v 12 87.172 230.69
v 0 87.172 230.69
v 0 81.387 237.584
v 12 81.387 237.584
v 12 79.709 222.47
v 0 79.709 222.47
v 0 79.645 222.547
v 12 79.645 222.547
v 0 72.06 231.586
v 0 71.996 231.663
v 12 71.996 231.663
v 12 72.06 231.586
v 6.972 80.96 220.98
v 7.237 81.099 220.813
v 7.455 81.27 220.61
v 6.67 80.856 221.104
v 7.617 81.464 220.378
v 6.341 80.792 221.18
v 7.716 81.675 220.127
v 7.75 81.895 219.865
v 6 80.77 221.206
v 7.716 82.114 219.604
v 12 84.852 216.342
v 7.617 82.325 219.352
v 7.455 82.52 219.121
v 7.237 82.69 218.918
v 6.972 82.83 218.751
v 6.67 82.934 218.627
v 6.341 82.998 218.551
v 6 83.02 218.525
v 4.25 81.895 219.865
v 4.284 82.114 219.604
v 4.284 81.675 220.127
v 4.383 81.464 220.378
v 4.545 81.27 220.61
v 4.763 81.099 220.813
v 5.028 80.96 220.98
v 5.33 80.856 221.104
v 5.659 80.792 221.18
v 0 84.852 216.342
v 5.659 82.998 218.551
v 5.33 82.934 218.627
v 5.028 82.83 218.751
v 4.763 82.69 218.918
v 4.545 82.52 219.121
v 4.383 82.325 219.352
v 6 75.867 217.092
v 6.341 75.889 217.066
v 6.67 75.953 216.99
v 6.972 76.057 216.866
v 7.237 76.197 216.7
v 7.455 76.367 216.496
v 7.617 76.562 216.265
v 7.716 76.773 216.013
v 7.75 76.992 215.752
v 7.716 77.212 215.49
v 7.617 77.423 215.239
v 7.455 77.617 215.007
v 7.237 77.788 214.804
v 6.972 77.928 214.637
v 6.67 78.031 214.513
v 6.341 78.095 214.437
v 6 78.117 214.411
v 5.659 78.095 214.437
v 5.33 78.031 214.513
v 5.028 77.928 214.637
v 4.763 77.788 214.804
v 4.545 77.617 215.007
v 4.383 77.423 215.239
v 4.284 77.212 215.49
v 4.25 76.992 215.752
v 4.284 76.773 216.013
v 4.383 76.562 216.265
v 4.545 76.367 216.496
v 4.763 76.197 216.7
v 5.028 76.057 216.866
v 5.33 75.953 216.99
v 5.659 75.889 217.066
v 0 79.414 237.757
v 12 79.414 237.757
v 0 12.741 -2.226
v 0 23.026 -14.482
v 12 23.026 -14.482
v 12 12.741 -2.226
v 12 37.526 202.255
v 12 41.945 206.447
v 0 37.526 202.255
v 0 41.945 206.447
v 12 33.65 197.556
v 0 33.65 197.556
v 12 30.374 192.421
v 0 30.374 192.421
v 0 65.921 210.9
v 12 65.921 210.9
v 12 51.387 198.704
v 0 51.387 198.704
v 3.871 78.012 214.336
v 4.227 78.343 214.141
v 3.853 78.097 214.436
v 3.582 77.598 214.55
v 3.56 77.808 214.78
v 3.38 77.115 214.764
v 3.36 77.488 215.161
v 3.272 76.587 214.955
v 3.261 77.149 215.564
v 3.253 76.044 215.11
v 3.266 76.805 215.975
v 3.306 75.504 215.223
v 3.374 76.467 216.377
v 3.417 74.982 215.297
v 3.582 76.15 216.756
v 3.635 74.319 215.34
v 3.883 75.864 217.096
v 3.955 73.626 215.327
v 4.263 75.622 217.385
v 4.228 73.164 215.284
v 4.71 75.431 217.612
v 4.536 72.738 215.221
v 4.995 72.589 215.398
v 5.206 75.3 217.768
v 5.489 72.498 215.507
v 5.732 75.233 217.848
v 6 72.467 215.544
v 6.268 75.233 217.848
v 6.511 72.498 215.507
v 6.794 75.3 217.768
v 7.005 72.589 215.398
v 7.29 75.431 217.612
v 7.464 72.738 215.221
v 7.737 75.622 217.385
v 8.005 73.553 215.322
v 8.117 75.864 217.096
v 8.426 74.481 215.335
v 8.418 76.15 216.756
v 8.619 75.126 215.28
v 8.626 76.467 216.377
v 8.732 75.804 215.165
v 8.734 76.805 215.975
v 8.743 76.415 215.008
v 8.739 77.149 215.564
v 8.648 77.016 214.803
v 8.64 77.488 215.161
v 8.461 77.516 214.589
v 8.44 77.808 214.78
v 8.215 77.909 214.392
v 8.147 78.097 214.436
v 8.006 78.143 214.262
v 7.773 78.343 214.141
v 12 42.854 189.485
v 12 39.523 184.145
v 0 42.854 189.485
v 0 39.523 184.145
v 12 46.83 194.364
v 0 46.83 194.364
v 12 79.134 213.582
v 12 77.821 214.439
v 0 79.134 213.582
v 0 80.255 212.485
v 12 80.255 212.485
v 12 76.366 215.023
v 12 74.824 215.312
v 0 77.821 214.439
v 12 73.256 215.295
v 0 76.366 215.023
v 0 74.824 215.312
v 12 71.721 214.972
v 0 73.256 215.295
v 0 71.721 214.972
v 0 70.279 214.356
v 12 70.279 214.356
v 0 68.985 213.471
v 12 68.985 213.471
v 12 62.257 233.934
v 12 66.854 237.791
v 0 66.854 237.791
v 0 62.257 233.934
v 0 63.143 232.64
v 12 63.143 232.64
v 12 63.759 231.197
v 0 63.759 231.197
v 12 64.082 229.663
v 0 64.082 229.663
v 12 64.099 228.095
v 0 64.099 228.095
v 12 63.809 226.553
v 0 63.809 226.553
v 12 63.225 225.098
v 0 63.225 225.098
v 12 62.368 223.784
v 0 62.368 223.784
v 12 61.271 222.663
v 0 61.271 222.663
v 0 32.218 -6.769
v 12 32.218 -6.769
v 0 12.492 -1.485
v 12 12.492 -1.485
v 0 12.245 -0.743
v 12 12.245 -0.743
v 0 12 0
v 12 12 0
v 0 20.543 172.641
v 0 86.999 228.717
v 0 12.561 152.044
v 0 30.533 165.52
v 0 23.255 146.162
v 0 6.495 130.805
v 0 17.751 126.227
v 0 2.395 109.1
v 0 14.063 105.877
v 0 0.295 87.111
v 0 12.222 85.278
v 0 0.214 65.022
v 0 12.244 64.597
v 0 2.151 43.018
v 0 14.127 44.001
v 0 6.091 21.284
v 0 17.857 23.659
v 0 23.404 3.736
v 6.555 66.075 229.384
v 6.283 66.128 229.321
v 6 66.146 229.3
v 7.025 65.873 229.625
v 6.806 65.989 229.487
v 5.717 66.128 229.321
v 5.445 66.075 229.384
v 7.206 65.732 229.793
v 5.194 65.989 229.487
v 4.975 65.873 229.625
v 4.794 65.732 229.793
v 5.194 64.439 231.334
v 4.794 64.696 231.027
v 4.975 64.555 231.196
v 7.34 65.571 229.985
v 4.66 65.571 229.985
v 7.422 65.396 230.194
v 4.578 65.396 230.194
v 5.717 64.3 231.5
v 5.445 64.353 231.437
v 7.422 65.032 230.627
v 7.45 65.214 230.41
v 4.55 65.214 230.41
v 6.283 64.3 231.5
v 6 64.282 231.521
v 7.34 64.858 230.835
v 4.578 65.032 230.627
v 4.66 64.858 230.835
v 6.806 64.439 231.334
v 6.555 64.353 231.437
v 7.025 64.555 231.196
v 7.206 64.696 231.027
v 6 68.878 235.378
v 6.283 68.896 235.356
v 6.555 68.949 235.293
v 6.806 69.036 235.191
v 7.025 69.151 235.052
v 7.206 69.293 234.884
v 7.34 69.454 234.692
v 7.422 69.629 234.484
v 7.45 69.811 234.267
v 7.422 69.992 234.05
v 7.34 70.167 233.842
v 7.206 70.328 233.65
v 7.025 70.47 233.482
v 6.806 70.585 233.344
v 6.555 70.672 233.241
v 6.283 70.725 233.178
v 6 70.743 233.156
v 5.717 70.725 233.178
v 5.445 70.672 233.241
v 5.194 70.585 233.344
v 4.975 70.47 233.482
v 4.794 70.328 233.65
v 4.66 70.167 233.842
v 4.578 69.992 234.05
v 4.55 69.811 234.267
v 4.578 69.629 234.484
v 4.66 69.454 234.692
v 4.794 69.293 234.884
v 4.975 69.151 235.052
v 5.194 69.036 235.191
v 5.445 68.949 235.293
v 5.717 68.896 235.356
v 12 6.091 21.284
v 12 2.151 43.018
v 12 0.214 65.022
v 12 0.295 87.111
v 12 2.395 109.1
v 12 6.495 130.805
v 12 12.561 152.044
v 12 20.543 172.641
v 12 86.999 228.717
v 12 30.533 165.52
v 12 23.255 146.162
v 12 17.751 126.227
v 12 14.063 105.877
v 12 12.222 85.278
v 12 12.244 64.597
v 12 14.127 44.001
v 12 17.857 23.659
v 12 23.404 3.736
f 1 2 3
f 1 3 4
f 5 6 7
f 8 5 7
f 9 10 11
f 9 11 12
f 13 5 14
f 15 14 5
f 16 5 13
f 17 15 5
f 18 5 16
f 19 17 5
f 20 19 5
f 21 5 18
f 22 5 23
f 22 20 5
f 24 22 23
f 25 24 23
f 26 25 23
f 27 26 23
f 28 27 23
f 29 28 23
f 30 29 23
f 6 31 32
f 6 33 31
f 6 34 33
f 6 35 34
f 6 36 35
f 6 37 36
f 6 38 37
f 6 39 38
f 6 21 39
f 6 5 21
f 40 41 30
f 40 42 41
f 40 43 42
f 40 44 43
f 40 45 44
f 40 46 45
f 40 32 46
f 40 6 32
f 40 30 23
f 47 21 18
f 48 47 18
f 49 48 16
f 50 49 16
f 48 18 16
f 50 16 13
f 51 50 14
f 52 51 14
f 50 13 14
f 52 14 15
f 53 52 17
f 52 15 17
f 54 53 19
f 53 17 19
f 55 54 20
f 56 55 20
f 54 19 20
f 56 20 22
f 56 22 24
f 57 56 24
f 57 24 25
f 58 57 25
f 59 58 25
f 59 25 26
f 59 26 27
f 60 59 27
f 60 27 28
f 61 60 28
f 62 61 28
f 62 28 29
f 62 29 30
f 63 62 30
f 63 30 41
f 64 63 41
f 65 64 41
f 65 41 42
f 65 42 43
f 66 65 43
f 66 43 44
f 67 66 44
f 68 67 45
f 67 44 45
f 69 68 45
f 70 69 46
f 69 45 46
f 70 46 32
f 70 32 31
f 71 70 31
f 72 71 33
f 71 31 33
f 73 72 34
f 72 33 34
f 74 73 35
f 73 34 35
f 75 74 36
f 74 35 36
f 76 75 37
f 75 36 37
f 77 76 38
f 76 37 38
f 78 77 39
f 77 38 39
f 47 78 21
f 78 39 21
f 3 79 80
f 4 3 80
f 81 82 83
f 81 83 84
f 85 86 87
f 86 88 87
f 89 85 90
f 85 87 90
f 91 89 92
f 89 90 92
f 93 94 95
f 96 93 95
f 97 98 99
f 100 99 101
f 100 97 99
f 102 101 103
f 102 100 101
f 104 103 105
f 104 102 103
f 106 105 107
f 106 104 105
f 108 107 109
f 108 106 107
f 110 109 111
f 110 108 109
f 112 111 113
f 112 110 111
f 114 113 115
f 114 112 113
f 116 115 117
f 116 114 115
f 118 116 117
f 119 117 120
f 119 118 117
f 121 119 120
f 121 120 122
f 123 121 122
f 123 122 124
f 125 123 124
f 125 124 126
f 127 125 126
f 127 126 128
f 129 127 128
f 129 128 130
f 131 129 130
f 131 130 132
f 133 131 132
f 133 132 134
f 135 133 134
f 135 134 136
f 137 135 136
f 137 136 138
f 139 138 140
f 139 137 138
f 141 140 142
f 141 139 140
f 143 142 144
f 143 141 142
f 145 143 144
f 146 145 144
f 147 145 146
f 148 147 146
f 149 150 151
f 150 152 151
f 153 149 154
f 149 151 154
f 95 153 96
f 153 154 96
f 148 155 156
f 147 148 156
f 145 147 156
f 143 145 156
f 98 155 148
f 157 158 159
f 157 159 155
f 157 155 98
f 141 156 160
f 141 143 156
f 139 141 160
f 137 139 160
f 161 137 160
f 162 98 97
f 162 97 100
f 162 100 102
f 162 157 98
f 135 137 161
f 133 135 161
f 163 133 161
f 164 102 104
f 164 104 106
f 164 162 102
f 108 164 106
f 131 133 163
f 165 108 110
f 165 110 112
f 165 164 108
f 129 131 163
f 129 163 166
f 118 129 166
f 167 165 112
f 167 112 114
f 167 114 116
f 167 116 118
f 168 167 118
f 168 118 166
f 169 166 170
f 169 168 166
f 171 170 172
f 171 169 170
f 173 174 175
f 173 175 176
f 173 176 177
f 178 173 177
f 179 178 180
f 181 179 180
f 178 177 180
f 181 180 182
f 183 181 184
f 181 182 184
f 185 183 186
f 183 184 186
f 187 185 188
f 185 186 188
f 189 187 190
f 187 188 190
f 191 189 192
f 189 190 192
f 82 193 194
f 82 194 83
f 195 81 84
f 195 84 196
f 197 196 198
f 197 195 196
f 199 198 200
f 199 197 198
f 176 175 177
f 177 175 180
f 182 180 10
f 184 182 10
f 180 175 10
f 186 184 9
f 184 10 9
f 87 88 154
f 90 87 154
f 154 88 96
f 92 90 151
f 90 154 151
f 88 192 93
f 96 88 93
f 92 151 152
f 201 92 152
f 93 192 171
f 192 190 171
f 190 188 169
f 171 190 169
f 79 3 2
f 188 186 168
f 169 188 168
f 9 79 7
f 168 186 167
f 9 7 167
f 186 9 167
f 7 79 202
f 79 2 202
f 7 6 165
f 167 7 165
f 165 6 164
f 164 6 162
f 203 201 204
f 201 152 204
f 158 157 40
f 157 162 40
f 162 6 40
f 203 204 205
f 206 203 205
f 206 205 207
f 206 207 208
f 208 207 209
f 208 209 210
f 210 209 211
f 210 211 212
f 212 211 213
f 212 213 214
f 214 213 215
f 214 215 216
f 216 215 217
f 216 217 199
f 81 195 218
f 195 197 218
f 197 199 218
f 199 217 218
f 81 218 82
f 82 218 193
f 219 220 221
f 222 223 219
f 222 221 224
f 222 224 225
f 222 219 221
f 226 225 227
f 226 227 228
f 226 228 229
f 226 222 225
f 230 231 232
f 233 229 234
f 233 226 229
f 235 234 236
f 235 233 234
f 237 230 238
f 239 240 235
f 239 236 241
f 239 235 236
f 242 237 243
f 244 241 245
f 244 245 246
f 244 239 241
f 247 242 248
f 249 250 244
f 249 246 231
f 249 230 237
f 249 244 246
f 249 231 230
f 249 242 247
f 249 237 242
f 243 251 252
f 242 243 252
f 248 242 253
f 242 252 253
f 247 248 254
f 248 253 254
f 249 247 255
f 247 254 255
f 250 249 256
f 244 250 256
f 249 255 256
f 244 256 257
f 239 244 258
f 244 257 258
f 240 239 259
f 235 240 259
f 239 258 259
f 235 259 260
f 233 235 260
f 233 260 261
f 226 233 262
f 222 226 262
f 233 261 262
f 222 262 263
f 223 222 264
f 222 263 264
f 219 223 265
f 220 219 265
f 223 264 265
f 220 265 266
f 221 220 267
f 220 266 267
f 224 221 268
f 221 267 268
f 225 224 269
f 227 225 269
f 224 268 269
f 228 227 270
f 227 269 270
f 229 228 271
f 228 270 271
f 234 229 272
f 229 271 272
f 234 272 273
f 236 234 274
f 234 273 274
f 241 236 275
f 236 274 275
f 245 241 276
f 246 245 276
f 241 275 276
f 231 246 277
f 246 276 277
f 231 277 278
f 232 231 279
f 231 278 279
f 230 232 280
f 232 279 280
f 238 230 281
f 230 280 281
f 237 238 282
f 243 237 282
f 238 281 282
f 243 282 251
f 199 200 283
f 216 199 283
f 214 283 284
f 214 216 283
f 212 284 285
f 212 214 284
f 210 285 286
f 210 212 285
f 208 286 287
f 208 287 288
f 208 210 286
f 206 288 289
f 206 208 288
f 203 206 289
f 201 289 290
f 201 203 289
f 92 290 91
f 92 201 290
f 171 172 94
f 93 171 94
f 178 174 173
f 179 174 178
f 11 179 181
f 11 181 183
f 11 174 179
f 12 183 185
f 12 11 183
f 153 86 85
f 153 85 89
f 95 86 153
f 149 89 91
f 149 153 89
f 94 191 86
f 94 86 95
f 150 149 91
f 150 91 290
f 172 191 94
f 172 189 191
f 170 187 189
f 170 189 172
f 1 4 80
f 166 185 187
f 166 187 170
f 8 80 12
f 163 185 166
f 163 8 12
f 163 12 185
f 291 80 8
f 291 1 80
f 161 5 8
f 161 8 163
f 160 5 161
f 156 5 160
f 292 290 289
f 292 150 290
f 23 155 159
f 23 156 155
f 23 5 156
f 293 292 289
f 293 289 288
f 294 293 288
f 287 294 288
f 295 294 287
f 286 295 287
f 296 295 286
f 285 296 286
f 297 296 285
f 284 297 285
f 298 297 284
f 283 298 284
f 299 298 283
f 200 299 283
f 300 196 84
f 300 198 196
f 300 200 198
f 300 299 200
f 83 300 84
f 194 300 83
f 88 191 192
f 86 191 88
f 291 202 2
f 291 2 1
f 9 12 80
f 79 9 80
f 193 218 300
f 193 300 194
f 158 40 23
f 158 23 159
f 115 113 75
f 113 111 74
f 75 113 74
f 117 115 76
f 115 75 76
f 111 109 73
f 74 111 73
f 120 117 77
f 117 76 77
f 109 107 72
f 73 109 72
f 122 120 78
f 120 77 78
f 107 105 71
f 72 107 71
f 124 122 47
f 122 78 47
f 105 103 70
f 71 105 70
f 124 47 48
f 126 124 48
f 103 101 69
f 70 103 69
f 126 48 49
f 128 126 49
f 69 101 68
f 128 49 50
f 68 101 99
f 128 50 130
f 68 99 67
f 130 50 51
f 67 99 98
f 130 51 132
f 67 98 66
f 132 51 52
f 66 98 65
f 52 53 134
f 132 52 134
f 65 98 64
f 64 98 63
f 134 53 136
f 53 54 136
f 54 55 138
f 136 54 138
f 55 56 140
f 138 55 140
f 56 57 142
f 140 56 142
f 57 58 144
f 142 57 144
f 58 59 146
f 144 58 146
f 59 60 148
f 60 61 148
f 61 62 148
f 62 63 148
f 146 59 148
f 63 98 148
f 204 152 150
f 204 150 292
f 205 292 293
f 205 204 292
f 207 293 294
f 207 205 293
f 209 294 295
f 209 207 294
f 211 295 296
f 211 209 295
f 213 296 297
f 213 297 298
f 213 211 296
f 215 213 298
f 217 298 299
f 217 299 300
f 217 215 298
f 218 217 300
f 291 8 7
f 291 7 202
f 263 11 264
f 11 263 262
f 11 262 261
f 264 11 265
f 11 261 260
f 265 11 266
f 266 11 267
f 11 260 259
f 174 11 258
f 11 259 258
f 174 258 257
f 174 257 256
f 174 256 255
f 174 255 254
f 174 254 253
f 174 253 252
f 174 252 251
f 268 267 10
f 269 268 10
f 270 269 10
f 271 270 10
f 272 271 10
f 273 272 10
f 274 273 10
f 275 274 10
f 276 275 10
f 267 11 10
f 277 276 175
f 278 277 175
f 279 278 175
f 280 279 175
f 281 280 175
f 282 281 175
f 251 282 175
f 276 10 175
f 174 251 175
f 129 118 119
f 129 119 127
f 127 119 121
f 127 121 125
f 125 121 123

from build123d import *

# Parameters (mm, degrees)
AUFSATZ_LINEAR_AUSTRAGEN1_DEPTH  = 12
AUFSATZ_LINEAR_AUSTRAGEN3_DEPTH  = 12
AUFSATZ_LINEAR_AUSTRAGEN4_DEPTH  = 12
SCHNITT_LINEAR_AUSTRAGEN1_DEPTH  = 254.175024926
VERRUNDUNG1_R                    = 50
SKIZZE9_W                        = 12
SKIZZE9_H                        = 12
AUFSATZ_LINEAR_AUSTRAGEN6_DEPTH  = 11
AUFSATZ_LINEAR_AUSTRAGEN7_DEPTH  = 12
SKIZZE11_R                       = 1.75
SCHNITT_LINEAR_AUSTRAGEN3_DEPTH  = 10
SKIZZE12_R                       = 2.75
SCHNITT_LINEAR_AUSTRAGEN4_DEPTH  = 3.6
FASE1_SIZE                       = 1.5
SCHNITT_LINEAR_AUSTRAGEN8_DEPTH  = 254.549622303
SKIZZE11_3_R                     = 1.45
SCHNITT_LINEAR_AUSTRAGEN10_DEPTH = 6


with BuildPart() as part:
    # Skizze1 → Aufsatz-Linear austragen1 (new body)
    with BuildSketch(Plane(origin=(0, 0, 0), x_dir=(0, 0, -1), z_dir=(1, 0, 0))):
        with BuildLine():
            Line((-240, 65), (-230.735708163, 72.773663864))
            ThreePointArc((-230.735708163, 72.773663864), (-123.944567763, 17.242039243), (-3.735818811, 23.403668612))
            Line((-3.735818811, 23.403668612), (0, 12))
            ThreePointArc((0, 12), (-127.247502729, 5.681119716), (-240, 65))
        make_face()
    extrude(amount=AUFSATZ_LINEAR_AUSTRAGEN1_DEPTH)

    # Skizze4 → Aufsatz-Linear austragen3 (add)
    with BuildSketch(Plane(origin=(0, 0, 0), x_dir=(0, 0, -1), z_dir=(1, 0, 0))):
        with BuildLine():
            Line((-3.735818811, 23.403668612), (6.769031275, 32.218284445))
            Line((6.769031275, 32.218284445), (14.482482591, 23.025751128))
            Line((14.482482591, 23.025751128), (2.225771501, 12.741149373))
            ThreePointArc((2.225771501, 12.741149373), (1.113785782, 12.367871772), (0, 12))
            Line((0, 12), (-3.735818811, 23.403668612))
        make_face()
    extrude(amount=AUFSATZ_LINEAR_AUSTRAGEN3_DEPTH)

    # Skizze5 → Aufsatz-Linear austragen4 (add)
    with BuildSketch(Plane(origin=(12, 0, 0), x_dir=(0, 0, -1), z_dir=(1, 0, 0))):
        Polygon((-231.662517154, 71.995978781), (-222.469983836, 79.709430098), (-210.899806862, 65.920630121), (-192.948331238, 44.526894555), (-220.092340179, 58.207178805), align=None)
    extrude(amount=-AUFSATZ_LINEAR_AUSTRAGEN4_DEPTH)

    # Skizze6 → Schnitt-Linear austragen1 (cut, through all)
    with BuildSketch(Plane(origin=(12, 0, 0), x_dir=(0, 0, -1), z_dir=(1, 0, 0))):
        Polygon((-231.662517154, 71.995978781), (-199.510648028, 33.678873242), (-204.367668784, 29.603348917), (-240, 65), align=None)
    extrude(amount=-SCHNITT_LINEAR_AUSTRAGEN1_DEPTH, mode=Mode.SUBTRACT)

    # Verrundung1
    verrundung1_edges = [part.edges().sort_by_distance(p)[0] for p in [
        (6, 44.526894555, 192.948331238),
        (6, 35.285406895, 200.858689823),
    ]]
    fillet(verrundung1_edges, radius=VERRUNDUNG1_R)

    # Skizze9 → Aufsatz-Linear austragen6 (add)
    with BuildSketch(Plane(origin=(0, 156.320496136, 131.168470653), x_dir=(1, 0, 0), z_dir=(0, 0.7660444431189836, 0.6427876096865328))):
        with Locations((6, -125.185660837)):
            Rectangle(SKIZZE9_W, SKIZZE9_H)
    extrude(amount=AUFSATZ_LINEAR_AUSTRAGEN6_DEPTH)

    # Skizze10 → Aufsatz-Linear austragen7 (add)
    with BuildSketch(Plane.ZY):
        with BuildLine():
            Line((231.662517154, 71.995978781), (237.790872699, 66.853677904))
            Line((237.790872699, 66.853677904), (233.93414704, 62.257411245))
            ThreePointArc((233.93414704, 62.257411245), (228.094600221, 64.098613285), (222.663490618, 61.271356578))
            Line((222.663490618, 61.271356578), (231.662517154, 71.995978781))
        make_face()
        with BuildLine():
            Line((213.470957301, 68.984807894), (222.469983836, 79.709430098))
            Line((222.469983836, 79.709430098), (216.341628291, 84.851730975))
            Line((216.341628291, 84.851730975), (212.484902633, 80.255464316))
            ThreePointArc((212.484902633, 80.255464316), (215.31215934, 74.824354713), (213.470957301, 68.984807894))
        make_face()
    extrude(amount=-AUFSATZ_LINEAR_AUSTRAGEN7_DEPTH)

    # Skizze11 → Schnitt-Linear austragen3 (cut)
    with BuildSketch(Plane(origin=(0, 156.320496136, 131.168470653), x_dir=(1, 0, 0), z_dir=(0, 0.7660444431189826, 0.642787609686534))):
        with Locations(Location((6, -115.785660837, 0), (0, 0, 270))):
            Circle(SKIZZE11_R)
    extrude(amount=-SCHNITT_LINEAR_AUSTRAGEN3_DEPTH, mode=Mode.SUBTRACT)

    # Skizze12 → Schnitt-Linear austragen4 (cut)
    with BuildSketch(Plane(origin=(0, 148.660051704, 124.740594556), x_dir=(1, 0, 0), z_dir=(0, 0.7660444431189826, 0.642787609686534))):
        with Locations((6, -115.785660837)):
            Circle(SKIZZE12_R)
    extrude(amount=SCHNITT_LINEAR_AUSTRAGEN4_DEPTH, mode=Mode.SUBTRACT)

    # Fase1
    fase1_edges = [part.edges().sort_by_distance(p)[0] for p in [
        (6, 88.135918972, 229.540647543),
        (6, 80.422467656, 238.73318086),
    ]]
    chamfer(fase1_edges, length=FASE1_SIZE)

    # Skizze16 → Schnitt-Linear austragen8 (cut, through all)
    with BuildSketch(Plane(origin=(12, 0, 0), x_dir=(0, 0, -1), z_dir=(1, 0, 0))):
        Polygon((-222.469983836, 79.709430098), (-222.546588281, 79.645151337), (-228.717349334, 86.999177991), (-228.640744889, 87.063456752), align=None)
        Polygon((-237.833278207, 79.350005435), (-231.662517154, 71.995978781), (-231.585912709, 72.060257542), (-237.756673762, 79.414284196), align=None)
    extrude(amount=-SCHNITT_LINEAR_AUSTRAGEN8_DEPTH, mode=Mode.SUBTRACT)

    # Skizze11<3> → Schnitt-Linear austragen10 (cut)
    with BuildSketch(Plane(origin=(0, 156.320496136, 131.168470653), x_dir=(1, 0, 0), z_dir=(0, 0.7660444431189826, 0.642787609686534))):
        with Locations(Location((6, -134.585660837, 0), (0, 0, 270))):
            Circle(SKIZZE11_3_R)
    extrude(amount=-SCHNITT_LINEAR_AUSTRAGEN10_DEPTH, mode=Mode.SUBTRACT)


solid = part.part
